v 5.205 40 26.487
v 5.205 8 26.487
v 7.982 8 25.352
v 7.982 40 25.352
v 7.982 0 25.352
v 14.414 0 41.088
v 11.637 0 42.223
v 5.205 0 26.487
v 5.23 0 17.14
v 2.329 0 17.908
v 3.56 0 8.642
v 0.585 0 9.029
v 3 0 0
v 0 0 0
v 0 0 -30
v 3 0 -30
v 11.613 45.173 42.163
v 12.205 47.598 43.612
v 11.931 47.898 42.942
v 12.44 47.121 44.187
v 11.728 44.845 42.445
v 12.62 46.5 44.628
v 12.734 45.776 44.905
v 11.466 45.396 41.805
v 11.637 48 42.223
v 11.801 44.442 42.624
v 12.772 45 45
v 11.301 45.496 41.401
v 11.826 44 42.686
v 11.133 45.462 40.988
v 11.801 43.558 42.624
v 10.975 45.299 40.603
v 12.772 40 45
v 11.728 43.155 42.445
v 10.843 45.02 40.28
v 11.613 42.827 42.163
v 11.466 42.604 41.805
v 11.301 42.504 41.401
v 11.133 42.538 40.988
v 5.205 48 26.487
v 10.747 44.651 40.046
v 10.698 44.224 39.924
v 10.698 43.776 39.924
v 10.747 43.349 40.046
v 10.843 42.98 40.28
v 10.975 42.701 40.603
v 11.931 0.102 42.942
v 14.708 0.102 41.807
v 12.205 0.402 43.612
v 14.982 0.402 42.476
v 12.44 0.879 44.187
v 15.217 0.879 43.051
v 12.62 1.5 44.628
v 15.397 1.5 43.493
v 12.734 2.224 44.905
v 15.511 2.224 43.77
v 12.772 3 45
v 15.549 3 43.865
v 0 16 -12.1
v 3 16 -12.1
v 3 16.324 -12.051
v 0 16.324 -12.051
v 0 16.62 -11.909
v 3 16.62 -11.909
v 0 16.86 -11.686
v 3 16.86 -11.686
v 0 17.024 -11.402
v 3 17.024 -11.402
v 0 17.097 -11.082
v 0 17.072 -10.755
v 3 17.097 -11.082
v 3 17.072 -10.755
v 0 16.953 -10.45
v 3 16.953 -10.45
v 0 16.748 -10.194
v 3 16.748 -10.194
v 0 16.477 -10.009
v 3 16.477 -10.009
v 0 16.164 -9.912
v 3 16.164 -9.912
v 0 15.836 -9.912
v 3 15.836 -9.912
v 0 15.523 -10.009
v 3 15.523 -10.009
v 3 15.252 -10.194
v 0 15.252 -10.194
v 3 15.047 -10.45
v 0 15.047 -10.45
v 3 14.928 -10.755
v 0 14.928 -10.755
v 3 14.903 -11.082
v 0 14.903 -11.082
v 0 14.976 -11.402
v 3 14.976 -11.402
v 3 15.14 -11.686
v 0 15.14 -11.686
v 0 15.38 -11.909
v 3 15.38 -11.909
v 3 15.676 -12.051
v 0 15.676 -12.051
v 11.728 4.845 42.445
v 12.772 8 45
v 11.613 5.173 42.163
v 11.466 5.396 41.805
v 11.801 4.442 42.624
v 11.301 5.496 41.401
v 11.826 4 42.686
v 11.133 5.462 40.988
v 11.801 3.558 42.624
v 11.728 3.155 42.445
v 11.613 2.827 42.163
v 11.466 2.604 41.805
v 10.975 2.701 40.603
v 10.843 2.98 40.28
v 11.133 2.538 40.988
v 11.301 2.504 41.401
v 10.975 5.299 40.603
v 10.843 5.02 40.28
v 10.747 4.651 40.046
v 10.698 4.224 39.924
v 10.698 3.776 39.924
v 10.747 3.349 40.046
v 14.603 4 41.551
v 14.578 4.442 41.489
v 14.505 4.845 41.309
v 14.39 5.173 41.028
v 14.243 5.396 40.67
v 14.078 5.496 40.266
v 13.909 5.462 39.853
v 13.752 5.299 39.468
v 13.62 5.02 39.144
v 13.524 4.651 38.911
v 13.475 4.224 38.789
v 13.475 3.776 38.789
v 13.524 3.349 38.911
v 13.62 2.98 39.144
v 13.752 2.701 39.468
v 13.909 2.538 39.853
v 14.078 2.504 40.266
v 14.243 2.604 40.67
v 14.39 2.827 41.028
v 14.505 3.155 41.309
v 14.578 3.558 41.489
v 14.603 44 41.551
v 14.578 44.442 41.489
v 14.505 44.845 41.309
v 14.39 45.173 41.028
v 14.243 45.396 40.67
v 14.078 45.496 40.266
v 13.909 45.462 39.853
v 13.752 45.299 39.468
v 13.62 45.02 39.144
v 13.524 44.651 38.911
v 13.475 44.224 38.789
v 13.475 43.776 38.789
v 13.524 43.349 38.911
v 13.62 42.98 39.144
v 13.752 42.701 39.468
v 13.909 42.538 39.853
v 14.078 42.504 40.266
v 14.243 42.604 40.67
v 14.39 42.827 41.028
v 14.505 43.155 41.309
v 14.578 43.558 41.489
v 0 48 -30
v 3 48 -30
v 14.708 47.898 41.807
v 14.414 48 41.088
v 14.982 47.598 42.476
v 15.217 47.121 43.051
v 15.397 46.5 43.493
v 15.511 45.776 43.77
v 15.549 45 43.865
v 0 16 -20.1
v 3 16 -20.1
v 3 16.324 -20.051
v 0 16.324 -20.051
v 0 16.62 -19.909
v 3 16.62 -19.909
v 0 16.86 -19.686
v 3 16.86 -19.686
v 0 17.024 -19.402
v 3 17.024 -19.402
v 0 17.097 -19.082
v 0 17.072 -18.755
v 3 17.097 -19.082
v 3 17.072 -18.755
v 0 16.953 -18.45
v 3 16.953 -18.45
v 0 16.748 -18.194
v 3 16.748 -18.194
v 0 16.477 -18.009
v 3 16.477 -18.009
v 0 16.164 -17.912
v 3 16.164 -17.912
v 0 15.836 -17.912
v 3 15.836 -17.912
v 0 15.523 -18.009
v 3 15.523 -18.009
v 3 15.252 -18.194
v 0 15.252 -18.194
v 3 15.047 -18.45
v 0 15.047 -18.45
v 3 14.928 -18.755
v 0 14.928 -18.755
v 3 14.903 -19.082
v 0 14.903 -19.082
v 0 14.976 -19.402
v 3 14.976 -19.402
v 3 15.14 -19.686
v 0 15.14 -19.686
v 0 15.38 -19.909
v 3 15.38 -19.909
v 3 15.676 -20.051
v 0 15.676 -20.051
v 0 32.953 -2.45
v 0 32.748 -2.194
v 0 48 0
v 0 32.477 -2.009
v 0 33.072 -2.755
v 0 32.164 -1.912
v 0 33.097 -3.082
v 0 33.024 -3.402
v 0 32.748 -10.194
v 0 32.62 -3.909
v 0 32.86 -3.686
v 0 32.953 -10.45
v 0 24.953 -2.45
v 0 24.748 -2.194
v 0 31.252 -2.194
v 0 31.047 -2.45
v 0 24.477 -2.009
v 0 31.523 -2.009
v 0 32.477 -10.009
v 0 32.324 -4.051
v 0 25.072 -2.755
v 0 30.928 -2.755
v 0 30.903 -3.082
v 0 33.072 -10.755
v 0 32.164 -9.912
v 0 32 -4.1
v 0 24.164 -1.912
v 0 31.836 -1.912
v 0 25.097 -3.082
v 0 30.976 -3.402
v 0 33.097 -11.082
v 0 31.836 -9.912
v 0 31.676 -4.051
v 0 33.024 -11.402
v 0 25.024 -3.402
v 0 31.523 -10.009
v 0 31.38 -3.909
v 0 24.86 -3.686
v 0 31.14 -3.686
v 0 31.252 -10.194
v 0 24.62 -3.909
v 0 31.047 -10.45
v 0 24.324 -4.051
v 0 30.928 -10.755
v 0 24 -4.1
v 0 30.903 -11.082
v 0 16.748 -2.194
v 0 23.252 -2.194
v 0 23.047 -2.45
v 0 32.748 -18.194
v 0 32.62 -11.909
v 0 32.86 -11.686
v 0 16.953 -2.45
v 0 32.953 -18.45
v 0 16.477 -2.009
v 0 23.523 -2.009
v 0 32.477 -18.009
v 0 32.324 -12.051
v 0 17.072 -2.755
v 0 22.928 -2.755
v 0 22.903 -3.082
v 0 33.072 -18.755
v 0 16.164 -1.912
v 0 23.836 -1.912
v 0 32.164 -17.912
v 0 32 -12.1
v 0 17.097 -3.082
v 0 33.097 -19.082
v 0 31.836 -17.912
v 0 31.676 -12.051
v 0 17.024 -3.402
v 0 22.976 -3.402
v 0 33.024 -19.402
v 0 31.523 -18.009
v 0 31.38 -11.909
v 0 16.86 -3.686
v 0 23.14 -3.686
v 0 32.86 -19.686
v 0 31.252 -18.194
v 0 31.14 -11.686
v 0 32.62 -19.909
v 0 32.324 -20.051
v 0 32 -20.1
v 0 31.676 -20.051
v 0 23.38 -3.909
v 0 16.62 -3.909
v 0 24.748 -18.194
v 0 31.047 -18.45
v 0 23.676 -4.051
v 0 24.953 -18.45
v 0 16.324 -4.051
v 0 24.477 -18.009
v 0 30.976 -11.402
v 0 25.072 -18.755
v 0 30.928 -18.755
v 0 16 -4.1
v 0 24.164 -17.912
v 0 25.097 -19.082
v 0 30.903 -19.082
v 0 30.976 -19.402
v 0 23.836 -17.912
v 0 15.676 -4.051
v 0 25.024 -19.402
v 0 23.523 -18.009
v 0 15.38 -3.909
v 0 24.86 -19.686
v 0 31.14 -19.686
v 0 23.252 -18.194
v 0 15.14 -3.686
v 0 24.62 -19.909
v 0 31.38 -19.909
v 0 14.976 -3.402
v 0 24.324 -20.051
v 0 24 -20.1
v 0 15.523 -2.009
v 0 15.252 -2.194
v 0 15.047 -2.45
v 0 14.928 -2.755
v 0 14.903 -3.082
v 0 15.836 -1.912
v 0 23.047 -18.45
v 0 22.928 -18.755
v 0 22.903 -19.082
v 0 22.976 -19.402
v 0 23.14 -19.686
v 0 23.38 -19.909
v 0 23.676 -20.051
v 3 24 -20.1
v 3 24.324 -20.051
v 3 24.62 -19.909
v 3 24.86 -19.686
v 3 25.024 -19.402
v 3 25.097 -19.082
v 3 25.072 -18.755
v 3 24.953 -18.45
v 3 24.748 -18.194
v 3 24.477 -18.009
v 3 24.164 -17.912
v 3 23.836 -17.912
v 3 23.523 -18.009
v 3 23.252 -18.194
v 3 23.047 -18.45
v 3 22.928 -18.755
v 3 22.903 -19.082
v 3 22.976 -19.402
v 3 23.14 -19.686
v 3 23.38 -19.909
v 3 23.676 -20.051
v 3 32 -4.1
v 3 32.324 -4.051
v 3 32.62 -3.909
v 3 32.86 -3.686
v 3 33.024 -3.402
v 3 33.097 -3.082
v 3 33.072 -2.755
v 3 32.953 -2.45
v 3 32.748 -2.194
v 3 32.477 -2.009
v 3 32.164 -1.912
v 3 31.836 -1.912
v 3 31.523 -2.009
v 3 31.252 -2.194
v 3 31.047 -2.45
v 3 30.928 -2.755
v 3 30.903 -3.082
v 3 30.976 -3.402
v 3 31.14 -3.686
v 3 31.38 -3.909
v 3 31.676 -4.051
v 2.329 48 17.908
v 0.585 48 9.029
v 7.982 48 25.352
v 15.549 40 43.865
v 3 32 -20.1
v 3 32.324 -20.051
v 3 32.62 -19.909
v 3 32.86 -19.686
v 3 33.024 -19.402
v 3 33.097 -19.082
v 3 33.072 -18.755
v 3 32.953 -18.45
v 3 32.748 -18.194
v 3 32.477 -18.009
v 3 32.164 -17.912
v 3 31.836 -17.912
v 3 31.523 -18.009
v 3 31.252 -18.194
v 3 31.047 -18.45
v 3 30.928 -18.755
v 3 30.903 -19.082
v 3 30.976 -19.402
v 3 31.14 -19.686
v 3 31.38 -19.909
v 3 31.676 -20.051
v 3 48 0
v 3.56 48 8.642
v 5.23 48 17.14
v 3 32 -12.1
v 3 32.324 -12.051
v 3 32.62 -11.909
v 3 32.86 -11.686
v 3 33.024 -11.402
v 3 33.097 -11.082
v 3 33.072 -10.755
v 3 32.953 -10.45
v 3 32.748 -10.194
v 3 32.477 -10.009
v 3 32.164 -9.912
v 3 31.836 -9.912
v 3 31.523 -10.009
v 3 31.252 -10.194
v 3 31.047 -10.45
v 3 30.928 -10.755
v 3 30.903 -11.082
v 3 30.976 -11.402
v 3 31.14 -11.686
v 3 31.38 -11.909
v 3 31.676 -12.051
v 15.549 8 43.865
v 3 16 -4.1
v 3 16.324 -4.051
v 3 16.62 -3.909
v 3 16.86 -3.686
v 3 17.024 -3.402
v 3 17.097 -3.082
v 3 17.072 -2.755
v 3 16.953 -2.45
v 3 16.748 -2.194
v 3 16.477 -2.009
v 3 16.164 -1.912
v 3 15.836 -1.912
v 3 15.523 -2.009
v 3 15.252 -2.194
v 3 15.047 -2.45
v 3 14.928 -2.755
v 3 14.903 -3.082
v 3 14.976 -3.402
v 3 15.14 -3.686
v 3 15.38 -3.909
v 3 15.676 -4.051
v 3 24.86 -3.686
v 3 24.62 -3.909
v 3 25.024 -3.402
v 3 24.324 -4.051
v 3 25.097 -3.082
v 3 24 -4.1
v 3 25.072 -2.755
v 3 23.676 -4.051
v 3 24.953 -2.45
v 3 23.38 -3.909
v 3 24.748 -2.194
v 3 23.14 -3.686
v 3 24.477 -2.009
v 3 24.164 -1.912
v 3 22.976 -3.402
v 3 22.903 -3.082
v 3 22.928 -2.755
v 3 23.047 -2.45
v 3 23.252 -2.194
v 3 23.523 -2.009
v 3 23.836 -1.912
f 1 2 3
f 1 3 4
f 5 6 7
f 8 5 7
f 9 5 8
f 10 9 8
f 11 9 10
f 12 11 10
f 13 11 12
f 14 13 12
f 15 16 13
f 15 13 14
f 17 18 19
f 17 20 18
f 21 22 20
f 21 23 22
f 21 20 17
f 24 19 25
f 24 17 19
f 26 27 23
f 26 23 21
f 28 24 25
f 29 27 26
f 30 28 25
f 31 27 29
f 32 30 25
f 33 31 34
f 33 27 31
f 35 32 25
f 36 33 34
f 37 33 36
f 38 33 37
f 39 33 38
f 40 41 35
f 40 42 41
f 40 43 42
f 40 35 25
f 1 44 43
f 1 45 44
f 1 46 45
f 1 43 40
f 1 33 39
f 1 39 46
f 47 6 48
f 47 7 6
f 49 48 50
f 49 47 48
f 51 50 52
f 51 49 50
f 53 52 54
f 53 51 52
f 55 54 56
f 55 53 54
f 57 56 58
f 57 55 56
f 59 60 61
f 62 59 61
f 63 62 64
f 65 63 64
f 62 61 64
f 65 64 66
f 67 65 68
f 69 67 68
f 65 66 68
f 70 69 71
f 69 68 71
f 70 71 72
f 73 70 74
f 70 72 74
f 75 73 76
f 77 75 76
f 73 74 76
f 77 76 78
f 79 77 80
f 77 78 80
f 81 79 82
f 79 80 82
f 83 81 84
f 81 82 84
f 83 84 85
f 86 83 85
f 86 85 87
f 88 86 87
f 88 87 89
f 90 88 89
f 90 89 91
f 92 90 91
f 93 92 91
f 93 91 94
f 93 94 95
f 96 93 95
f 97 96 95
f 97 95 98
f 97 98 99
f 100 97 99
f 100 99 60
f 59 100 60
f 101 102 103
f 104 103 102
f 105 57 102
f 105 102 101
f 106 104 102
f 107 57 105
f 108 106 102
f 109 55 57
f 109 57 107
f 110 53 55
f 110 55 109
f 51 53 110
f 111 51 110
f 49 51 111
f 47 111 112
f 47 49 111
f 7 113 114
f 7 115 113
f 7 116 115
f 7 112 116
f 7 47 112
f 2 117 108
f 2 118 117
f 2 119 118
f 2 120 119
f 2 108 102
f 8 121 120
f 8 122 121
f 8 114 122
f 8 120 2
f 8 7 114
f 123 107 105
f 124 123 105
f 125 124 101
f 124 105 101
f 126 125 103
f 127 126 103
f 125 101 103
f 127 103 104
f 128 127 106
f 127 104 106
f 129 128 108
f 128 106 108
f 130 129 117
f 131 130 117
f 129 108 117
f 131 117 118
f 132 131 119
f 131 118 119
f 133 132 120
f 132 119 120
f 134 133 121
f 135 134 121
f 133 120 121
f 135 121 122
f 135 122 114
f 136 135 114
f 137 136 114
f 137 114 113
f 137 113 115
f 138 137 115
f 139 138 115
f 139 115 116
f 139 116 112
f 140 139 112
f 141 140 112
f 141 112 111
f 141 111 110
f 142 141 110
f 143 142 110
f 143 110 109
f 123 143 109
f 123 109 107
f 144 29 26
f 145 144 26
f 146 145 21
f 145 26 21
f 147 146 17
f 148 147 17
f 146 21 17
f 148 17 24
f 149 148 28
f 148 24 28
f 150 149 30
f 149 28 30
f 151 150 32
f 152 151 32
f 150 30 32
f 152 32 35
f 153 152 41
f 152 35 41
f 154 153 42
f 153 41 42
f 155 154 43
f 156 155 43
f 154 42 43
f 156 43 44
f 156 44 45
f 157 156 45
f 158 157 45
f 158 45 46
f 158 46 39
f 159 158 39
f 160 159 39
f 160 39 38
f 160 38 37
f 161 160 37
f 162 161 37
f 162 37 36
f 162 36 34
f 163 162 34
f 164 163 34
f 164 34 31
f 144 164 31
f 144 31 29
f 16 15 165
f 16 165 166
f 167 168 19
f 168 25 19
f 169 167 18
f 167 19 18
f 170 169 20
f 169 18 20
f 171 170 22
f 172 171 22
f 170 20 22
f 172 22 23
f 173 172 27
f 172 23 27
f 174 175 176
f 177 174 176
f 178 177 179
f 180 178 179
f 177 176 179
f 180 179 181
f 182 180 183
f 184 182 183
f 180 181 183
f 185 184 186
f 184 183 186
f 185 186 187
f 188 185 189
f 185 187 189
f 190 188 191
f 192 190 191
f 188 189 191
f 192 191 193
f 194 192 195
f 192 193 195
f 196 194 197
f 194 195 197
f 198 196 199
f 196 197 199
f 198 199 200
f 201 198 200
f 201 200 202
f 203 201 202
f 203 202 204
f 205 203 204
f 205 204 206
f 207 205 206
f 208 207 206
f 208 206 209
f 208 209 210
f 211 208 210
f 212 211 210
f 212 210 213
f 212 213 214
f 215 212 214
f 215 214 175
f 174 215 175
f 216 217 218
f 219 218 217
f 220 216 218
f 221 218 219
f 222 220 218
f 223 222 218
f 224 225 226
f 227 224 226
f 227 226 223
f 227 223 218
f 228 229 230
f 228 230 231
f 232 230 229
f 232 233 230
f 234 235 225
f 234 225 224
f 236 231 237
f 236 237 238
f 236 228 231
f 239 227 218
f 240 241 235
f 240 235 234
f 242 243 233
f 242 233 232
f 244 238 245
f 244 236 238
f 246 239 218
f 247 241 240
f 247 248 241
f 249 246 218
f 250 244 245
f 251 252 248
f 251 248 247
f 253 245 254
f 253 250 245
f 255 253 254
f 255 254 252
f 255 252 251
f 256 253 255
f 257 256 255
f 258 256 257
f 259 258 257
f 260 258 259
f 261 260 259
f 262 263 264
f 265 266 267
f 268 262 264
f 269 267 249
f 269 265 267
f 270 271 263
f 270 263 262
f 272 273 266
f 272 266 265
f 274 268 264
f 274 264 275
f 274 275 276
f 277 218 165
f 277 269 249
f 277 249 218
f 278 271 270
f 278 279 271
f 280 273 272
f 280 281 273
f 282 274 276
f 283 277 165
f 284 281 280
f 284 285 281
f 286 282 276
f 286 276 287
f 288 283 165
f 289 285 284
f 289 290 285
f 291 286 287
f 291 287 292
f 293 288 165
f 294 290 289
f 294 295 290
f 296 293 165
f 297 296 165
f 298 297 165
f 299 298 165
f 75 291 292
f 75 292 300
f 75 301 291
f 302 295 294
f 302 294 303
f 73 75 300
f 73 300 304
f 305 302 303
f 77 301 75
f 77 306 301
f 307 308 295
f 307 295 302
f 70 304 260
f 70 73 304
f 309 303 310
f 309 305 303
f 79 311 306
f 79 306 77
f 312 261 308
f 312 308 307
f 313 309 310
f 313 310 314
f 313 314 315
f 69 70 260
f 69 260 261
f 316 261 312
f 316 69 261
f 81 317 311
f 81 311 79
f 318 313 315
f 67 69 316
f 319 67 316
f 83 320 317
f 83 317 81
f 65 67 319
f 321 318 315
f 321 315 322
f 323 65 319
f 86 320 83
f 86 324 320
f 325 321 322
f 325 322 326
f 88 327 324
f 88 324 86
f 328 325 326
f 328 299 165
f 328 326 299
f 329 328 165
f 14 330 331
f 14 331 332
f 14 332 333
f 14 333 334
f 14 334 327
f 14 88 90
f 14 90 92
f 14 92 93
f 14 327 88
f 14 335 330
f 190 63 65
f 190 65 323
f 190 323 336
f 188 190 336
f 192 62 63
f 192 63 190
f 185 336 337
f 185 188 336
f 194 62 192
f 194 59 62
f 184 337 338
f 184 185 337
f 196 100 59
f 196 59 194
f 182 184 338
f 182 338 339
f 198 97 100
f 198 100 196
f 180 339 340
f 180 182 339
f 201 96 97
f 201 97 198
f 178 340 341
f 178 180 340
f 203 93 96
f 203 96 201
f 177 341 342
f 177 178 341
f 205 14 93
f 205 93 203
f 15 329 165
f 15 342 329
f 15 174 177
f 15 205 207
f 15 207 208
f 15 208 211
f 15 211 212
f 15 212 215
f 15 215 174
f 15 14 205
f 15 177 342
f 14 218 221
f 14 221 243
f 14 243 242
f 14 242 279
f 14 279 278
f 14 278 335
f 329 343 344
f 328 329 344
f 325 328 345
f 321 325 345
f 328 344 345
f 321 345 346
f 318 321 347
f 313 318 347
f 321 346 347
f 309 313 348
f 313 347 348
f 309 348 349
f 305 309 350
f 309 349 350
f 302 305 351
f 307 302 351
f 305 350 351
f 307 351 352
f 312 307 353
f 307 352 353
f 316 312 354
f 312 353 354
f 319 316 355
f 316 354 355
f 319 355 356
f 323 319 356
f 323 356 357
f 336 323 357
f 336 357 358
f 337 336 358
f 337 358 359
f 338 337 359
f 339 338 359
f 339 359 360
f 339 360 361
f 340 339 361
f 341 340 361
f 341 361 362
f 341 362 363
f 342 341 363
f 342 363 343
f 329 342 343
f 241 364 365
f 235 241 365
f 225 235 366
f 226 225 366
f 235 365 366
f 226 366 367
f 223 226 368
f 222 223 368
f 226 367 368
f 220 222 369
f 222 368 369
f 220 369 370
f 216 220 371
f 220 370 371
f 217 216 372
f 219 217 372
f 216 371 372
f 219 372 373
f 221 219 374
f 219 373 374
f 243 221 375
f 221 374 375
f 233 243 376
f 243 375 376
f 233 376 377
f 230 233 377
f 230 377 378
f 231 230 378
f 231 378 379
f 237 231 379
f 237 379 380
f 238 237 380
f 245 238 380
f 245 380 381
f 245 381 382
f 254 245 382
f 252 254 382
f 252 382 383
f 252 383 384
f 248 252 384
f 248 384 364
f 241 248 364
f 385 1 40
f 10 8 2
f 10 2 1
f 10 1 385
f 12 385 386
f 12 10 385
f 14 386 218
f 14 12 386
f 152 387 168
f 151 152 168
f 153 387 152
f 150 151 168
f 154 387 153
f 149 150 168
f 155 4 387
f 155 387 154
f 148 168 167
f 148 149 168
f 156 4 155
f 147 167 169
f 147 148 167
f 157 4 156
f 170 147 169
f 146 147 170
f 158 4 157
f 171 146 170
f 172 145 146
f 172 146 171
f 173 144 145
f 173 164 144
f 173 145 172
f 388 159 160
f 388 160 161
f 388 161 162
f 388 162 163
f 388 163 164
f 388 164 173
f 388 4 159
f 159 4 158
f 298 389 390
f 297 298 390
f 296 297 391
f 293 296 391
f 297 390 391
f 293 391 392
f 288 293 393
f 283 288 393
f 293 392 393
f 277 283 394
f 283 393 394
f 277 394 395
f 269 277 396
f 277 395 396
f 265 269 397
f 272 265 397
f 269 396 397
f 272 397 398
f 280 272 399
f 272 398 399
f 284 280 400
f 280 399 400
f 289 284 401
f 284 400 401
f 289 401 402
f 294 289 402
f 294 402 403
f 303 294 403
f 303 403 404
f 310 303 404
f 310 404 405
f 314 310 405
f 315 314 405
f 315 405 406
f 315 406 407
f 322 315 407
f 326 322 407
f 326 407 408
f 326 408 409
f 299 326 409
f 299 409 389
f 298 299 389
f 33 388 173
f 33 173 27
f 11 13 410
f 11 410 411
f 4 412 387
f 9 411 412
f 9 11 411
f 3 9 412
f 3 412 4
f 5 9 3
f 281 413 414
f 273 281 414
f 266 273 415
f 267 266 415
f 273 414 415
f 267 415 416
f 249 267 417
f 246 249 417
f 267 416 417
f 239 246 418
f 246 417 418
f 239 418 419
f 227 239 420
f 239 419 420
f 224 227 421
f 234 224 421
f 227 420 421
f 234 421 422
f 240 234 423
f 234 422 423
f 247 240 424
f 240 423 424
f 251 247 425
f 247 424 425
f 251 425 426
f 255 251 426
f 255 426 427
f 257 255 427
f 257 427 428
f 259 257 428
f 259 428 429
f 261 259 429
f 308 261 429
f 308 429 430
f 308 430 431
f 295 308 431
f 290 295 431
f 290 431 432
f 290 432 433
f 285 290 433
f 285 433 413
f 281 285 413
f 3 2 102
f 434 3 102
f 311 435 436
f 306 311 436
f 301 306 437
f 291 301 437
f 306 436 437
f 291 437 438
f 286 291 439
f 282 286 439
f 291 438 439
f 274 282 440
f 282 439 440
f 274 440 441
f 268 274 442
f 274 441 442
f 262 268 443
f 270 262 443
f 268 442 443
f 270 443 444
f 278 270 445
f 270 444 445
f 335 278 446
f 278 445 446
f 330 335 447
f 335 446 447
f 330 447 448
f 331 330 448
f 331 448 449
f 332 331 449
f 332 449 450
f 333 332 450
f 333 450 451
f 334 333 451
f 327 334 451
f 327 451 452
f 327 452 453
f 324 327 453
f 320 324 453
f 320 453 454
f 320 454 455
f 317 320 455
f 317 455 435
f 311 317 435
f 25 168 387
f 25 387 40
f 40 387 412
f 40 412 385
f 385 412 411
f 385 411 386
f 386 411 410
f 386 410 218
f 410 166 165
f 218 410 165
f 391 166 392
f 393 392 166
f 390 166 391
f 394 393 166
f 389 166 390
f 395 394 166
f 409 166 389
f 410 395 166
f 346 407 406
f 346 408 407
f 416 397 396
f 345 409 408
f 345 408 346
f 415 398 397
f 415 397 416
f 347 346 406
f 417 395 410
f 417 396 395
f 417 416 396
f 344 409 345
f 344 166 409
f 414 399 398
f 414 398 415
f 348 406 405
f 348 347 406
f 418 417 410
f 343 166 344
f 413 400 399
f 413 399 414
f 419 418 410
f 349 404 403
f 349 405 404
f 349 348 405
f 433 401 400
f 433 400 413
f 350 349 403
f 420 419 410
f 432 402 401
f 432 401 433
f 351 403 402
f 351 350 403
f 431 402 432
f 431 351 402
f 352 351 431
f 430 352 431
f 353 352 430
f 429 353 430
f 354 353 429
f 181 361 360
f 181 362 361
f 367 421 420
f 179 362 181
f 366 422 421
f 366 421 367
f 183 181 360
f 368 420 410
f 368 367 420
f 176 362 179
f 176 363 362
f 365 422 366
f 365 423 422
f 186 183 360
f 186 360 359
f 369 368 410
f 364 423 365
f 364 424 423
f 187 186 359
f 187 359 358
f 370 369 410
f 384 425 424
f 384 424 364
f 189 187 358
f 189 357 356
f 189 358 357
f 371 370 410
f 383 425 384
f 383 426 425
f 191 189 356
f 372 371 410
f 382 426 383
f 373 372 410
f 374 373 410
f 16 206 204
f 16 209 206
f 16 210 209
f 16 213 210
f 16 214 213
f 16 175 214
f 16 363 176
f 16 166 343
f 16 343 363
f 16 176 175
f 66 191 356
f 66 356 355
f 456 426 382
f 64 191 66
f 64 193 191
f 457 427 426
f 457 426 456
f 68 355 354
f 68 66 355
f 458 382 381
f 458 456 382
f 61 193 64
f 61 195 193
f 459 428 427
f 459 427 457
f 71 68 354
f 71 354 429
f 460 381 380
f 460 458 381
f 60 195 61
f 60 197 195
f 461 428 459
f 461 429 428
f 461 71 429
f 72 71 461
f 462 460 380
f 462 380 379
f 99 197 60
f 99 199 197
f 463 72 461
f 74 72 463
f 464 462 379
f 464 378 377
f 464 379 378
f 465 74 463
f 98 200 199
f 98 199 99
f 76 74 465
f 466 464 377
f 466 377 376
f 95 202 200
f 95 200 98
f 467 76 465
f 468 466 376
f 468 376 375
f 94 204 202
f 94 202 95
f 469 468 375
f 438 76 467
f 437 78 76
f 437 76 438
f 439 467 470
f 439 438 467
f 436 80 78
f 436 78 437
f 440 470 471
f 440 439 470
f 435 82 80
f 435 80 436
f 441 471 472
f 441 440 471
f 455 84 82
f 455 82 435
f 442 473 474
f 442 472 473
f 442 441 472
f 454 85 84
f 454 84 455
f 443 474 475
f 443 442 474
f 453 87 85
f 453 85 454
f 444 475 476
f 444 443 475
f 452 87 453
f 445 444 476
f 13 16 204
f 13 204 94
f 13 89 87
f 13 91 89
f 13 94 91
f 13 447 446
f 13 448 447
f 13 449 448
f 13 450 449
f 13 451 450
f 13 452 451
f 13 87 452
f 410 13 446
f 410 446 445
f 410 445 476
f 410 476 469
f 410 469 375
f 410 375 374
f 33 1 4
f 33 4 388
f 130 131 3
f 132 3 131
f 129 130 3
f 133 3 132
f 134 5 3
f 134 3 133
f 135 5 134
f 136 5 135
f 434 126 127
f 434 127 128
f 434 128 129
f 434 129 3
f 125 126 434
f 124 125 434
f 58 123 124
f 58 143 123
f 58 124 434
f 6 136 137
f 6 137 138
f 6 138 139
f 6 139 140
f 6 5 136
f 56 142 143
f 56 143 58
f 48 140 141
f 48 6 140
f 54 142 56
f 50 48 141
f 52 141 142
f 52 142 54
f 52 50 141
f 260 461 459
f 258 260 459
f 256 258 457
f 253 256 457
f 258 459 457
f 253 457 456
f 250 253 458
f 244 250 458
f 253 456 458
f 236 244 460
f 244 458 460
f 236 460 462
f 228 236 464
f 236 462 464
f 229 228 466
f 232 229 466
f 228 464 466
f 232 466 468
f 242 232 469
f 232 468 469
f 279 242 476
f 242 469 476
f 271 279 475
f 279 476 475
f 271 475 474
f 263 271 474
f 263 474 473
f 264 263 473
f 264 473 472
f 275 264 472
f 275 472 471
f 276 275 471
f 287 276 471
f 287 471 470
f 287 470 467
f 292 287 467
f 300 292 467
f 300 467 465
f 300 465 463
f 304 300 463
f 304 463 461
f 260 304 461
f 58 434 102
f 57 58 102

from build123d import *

# Parameters (mm, degrees)
EXTRUSION1_DEPTH = 48
EXTRUSION3_REACH = 32.949
ESQUISSE2_R      = 1.5
ESQUISSE2_W      = 20
ESQUISSE2_H      = 32
CONG_1_R         = 3
EXTRUSION4_REACH = 5
ESQUISSE3_R      = 1.1


with BuildPart() as part:
    # Esquisse1 → Extrusion1 (new body)
    with BuildSketch(Plane(origin=(0, 0, 0), x_dir=(1, 0, 0), z_dir=(0, 1, 0))):
        with BuildLine():
            Line((0, 0), (0, 30))
            Line((0, 30), (3, 30))
            Line((3, 30), (3, 0))
            ThreePointArc((3, 0), (4.257195182, -12.918344113), (7.981600437, -25.351885839))
            Line((7.981600437, -25.351885839), (15.549327553, -43.864840933))
            Line((15.549327553, -43.864840933), (12.772384289, -45))
            Line((12.772384289, -45), (5.204657173, -26.487044906))
            ThreePointArc((5.204657173, -26.487044906), (1.313487503, -13.496777432), (0, 0))
        make_face()
    extrude(amount=EXTRUSION1_DEPTH)

    # Esquisse2 → Extrusion3 (cut, up to next)
    with BuildSketch(Plane(origin=(-4.817679226, 0, 1.969371261), x_dir=(0.378386356, 0, 0.925647755), z_dir=(-0.925647755, 0, 0.378386356)), mode=Mode.PRIVATE) as extrusion3_sk1:
        with Locations((42.487044906, 4)):
            Circle(ESQUISSE2_R)
    extrusion3_tool1 = extrude(extrusion3_sk1.sketch, amount=-EXTRUSION3_REACH, mode=Mode.PRIVATE) & part.part
    add(extrusion3_tool1.solids().sort_by_distance((11.258839, 4, 41.297409))[0], mode=Mode.SUBTRACT)
    # Esquisse2 → Extrusion3 (cut, up to next)
    with BuildSketch(Plane(origin=(-4.817679226, 0, 1.969371261), x_dir=(0.378386356, 0, 0.925647755), z_dir=(-0.925647755, 0, 0.378386356)), mode=Mode.PRIVATE) as extrusion3_sk2:
        with Locations((42.487044906, 44)):
            Circle(ESQUISSE2_R)
    extrusion3_tool2 = extrude(extrusion3_sk2.sketch, amount=-EXTRUSION3_REACH, mode=Mode.PRIVATE) & part.part
    add(extrusion3_tool2.solids().sort_by_distance((11.258839, 44, 41.297409))[0], mode=Mode.SUBTRACT)
    # Esquisse2 → Extrusion3 (cut, up to next)
    with BuildSketch(Plane(origin=(-4.817679226, 0, 1.969371261), x_dir=(0.378386356, 0, 0.925647755), z_dir=(-0.925647755, 0, 0.378386356)), mode=Mode.PRIVATE) as extrusion3_sk3:
        with Locations((36.487044906, 24)):
            Rectangle(ESQUISSE2_W, ESQUISSE2_H)
    extrusion3_tool3 = extrude(extrusion3_sk3.sketch, amount=-EXTRUSION3_REACH, mode=Mode.PRIVATE) & part.part
    add(extrusion3_tool3.solids().sort_by_distance((8.988521, 24, 35.743522))[0], mode=Mode.SUBTRACT)

    # Congé1
    cong_1_edges = [part.edges().sort_by_distance(p)[0] for p in [
        (14.160855921, 48, 44.432420466),
        (14.160855921, 0, 44.432420466),
    ]]
    fillet(cong_1_edges, radius=CONG_1_R)

    # Esquisse3 → Extrusion4 (cut, up to next)
    with BuildSketch(Plane(origin=(3, 0, 0), x_dir=(0, 0, -1), z_dir=(1, 0, 0)), mode=Mode.PRIVATE) as extrusion4_sk1:
        with Locations((3, 16)):
            Circle(ESQUISSE3_R)
    extrusion4_tool1 = extrude(extrusion4_sk1.sketch, amount=-EXTRUSION4_REACH, mode=Mode.PRIVATE) & part.part
    add(extrusion4_tool1.solids().sort_by_distance((3, 16, -3))[0], mode=Mode.SUBTRACT)
    # Esquisse3 → Extrusion4 (cut, up to next)
    with BuildSketch(Plane(origin=(3, 0, 0), x_dir=(0, 0, -1), z_dir=(1, 0, 0)), mode=Mode.PRIVATE) as extrusion4_sk2:
        with Locations((11, 16)):
            Circle(ESQUISSE3_R)
    extrusion4_tool2 = extrude(extrusion4_sk2.sketch, amount=-EXTRUSION4_REACH, mode=Mode.PRIVATE) & part.part
    add(extrusion4_tool2.solids().sort_by_distance((3, 16, -11))[0], mode=Mode.SUBTRACT)
    # Esquisse3 → Extrusion4 (cut, up to next)
    with BuildSketch(Plane(origin=(3, 0, 0), x_dir=(0, 0, -1), z_dir=(1, 0, 0)), mode=Mode.PRIVATE) as extrusion4_sk3:
        with Locations((19, 16)):
            Circle(ESQUISSE3_R)
    extrusion4_tool3 = extrude(extrusion4_sk3.sketch, amount=-EXTRUSION4_REACH, mode=Mode.PRIVATE) & part.part
    add(extrusion4_tool3.solids().sort_by_distance((3, 16, -19))[0], mode=Mode.SUBTRACT)
    # Esquisse3 → Extrusion4 (cut, up to next)
    with BuildSketch(Plane(origin=(3, 0, 0), x_dir=(0, 0, -1), z_dir=(1, 0, 0)), mode=Mode.PRIVATE) as extrusion4_sk4:
        with Locations((3, 24)):
            Circle(ESQUISSE3_R)
    extrusion4_tool4 = extrude(extrusion4_sk4.sketch, amount=-EXTRUSION4_REACH, mode=Mode.PRIVATE) & part.part
    add(extrusion4_tool4.solids().sort_by_distance((3, 24, -3))[0], mode=Mode.SUBTRACT)
    # Esquisse3 → Extrusion4 (cut, up to next)
    with BuildSketch(Plane(origin=(3, 0, 0), x_dir=(0, 0, -1), z_dir=(1, 0, 0)), mode=Mode.PRIVATE) as extrusion4_sk5:
        with Locations((19, 24)):
            Circle(ESQUISSE3_R)
    extrusion4_tool5 = extrude(extrusion4_sk5.sketch, amount=-EXTRUSION4_REACH, mode=Mode.PRIVATE) & part.part
    add(extrusion4_tool5.solids().sort_by_distance((3, 24, -19))[0], mode=Mode.SUBTRACT)
    # Esquisse3 → Extrusion4 (cut, up to next)
    with BuildSketch(Plane(origin=(3, 0, 0), x_dir=(0, 0, -1), z_dir=(1, 0, 0)), mode=Mode.PRIVATE) as extrusion4_sk6:
        with Locations((19, 32)):
            Circle(ESQUISSE3_R)
    extrusion4_tool6 = extrude(extrusion4_sk6.sketch, amount=-EXTRUSION4_REACH, mode=Mode.PRIVATE) & part.part
    add(extrusion4_tool6.solids().sort_by_distance((3, 32, -19))[0], mode=Mode.SUBTRACT)
    # Esquisse3 → Extrusion4 (cut, up to next)
    with BuildSketch(Plane(origin=(3, 0, 0), x_dir=(0, 0, -1), z_dir=(1, 0, 0)), mode=Mode.PRIVATE) as extrusion4_sk7:
        with Locations((11, 32)):
            Circle(ESQUISSE3_R)
    extrusion4_tool7 = extrude(extrusion4_sk7.sketch, amount=-EXTRUSION4_REACH, mode=Mode.PRIVATE) & part.part
    add(extrusion4_tool7.solids().sort_by_distance((3, 32, -11))[0], mode=Mode.SUBTRACT)
    # Esquisse3 → Extrusion4 (cut, up to next)
    with BuildSketch(Plane(origin=(3, 0, 0), x_dir=(0, 0, -1), z_dir=(1, 0, 0)), mode=Mode.PRIVATE) as extrusion4_sk8:
        with Locations((3, 32)):
            Circle(ESQUISSE3_R)
    extrusion4_tool8 = extrude(extrusion4_sk8.sketch, amount=-EXTRUSION4_REACH, mode=Mode.PRIVATE) & part.part
    add(extrusion4_tool8.solids().sort_by_distance((3, 32, -3))[0], mode=Mode.SUBTRACT)


solid = part.part
